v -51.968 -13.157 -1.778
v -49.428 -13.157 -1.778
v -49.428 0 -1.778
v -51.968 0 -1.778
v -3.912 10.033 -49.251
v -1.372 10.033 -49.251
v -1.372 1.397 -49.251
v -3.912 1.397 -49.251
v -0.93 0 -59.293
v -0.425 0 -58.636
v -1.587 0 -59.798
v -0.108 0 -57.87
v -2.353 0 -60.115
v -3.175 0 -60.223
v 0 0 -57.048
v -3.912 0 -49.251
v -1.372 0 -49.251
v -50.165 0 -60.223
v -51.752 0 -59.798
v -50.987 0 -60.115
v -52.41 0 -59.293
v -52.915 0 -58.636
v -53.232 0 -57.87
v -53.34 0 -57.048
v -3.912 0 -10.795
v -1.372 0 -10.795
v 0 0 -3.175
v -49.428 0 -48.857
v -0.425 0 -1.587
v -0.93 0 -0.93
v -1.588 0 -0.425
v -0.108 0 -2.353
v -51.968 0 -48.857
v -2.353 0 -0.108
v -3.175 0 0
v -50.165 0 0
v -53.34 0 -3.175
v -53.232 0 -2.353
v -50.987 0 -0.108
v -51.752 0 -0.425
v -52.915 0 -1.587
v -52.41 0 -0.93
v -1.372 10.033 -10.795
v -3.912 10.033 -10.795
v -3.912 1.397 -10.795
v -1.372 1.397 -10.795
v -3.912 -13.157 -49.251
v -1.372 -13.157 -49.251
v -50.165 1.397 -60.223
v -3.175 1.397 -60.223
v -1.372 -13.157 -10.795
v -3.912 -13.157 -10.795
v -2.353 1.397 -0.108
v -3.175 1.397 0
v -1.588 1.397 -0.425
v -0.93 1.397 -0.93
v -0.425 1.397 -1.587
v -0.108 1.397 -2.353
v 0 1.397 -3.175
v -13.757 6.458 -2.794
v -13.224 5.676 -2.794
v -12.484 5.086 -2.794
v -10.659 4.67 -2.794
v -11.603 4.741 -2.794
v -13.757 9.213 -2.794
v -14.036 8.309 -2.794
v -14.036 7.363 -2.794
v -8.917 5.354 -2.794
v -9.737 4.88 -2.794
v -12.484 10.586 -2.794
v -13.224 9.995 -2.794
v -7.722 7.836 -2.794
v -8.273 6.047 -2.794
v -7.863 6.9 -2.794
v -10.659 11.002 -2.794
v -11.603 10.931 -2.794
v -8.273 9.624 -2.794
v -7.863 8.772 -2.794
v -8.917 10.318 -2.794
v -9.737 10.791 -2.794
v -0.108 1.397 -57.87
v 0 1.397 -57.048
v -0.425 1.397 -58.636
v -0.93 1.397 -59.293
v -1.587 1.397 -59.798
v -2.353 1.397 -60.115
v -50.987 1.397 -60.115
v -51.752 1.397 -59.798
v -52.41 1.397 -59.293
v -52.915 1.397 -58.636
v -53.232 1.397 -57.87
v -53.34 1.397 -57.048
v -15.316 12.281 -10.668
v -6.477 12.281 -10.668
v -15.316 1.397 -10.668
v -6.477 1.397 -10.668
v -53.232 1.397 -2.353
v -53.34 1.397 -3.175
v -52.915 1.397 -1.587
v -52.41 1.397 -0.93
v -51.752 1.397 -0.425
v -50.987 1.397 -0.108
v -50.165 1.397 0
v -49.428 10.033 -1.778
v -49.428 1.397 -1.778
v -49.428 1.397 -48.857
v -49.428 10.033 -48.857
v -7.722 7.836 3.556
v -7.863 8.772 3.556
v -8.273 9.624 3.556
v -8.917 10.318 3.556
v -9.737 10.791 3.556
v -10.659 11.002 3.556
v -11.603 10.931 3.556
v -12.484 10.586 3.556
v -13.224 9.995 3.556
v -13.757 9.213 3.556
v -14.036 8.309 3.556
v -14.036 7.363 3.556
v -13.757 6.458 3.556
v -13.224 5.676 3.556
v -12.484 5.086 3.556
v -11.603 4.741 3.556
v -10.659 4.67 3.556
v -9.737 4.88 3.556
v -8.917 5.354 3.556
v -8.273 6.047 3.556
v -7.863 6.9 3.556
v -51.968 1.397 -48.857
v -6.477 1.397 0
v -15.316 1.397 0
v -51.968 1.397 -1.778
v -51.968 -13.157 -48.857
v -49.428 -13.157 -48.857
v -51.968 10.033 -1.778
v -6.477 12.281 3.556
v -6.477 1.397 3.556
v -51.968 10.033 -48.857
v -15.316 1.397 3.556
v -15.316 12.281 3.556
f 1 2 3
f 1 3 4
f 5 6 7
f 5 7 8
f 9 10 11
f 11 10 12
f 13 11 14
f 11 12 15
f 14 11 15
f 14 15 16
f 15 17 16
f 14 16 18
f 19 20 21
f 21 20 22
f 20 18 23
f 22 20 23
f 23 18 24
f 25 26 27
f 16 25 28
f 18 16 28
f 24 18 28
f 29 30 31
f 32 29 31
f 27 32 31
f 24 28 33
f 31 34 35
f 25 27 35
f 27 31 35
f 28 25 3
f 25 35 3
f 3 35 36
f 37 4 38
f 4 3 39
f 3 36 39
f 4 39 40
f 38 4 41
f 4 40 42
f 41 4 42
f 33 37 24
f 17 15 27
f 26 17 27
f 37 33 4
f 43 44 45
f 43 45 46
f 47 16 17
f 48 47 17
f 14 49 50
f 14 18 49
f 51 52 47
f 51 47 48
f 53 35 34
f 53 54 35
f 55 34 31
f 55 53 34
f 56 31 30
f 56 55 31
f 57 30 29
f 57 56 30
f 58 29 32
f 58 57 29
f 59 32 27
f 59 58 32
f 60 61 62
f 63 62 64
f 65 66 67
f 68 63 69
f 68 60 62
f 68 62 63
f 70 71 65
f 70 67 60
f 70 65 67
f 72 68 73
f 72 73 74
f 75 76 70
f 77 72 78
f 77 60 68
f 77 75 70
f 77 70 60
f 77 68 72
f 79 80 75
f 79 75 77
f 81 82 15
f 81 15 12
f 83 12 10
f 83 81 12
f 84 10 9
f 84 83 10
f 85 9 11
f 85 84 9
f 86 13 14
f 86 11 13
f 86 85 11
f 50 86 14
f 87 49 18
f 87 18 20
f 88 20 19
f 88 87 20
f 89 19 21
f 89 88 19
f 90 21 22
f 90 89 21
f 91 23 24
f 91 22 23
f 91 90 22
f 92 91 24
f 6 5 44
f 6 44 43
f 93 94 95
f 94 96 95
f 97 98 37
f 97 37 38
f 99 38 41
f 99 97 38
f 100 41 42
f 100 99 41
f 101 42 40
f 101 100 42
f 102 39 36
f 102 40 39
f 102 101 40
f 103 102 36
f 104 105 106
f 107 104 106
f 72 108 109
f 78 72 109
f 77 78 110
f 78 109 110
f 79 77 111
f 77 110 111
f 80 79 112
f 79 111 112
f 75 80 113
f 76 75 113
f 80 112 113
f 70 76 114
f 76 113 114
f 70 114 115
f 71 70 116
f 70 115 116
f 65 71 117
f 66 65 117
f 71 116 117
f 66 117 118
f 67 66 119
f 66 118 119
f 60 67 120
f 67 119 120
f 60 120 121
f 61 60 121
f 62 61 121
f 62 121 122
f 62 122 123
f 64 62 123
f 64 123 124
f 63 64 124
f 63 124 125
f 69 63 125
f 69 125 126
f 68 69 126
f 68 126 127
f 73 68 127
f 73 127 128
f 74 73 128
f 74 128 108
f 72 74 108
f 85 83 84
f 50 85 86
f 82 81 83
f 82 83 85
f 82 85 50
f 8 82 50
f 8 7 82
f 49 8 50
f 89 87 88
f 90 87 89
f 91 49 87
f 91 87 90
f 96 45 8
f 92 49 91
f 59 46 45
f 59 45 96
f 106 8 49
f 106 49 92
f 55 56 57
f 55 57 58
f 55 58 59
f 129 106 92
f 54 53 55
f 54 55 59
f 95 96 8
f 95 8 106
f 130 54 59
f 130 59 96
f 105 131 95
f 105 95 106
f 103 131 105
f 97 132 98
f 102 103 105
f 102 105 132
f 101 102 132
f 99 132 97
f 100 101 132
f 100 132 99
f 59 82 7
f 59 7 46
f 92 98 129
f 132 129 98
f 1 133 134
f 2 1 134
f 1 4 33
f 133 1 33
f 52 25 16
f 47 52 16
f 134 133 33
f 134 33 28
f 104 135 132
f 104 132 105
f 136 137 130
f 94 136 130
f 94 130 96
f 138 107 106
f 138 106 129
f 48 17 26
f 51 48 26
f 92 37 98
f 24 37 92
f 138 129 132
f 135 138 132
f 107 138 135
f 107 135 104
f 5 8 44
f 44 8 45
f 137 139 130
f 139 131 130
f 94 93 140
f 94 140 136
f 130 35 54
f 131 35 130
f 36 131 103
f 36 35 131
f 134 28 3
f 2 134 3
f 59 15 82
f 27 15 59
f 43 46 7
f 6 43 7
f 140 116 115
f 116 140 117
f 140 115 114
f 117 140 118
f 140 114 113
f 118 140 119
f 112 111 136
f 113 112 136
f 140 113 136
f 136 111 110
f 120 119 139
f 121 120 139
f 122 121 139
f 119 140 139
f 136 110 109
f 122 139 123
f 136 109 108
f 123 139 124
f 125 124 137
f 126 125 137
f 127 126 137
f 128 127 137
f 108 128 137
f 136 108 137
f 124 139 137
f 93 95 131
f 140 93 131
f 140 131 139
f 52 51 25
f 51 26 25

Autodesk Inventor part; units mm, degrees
ref_plane "YZ Plane" through (0, 0, 0) normal (1, 0, 0) x (0, 1, 0)
ref_plane "XZ Plane" through (0, 0, 0) normal (0, 1, 0) x (-1, 0, 0)
ref_plane "XY Plane" through (0, 0, 0) normal (0, 0, 1) x (1, 0, 0)
sketch "Sketch1" plane through (0, 0, 0) normal (0, 1, 0) x (-1, 0, 0)
  line L0 (0, 0) -> (53.34, 0)
  line L1 (53.34, 0) -> (53.34, -60.2234)
  line L2 (53.34, -60.2234) -> (0, -60.2234)
  line L3 (0, -60.2234) -> (0, 0)
  dimension "d0" = 53.34
  dimension "d1" = 60.2234
extrude "Extrusion1" add sketch "Sketch1" along normal blind 1.397
fillet "Fillet1" radius 3.175 4 edges at (0, 0.6985, -60.2234) (-53.34, 0.6985, -60.2234) (0, 0.6985, 0) (-53.34, 0.6985, 0)
sketch "Sketch2" plane through (0, 1.397, 0) normal (0, 1, 0) x (1, 0, 0)
  line L0 (0, 0) -> (-74.2846, 0) construction
  line L1 (0, 0) -> (0, 92.3898) construction
  line L2 (-3.9116, 10.795) -> (-1.3716, 10.795)
  line L3 (-1.3716, 10.795) -> (-1.3716, 49.2506)
  line L4 (-1.3716, 49.2506) -> (-3.9116, 49.2506)
  line L5 (-3.9116, 49.2506) -> (-3.9116, 10.795)
  line L6 (-51.9684, 1.778) -> (-49.4284, 1.778)
  line L7 (-49.4284, 1.778) -> (-49.4284, 48.8569)
  line L8 (-49.4284, 48.8569) -> (-51.9684, 48.8569)
  line L9 (-51.9684, 48.8569) -> (-51.9684, 1.778)
  line L10 (-53.34, 57.0484) -> (-53.34, 3.175) projected
  line L11 (-53.34, 50.5823) -> (-53.34, -10.1143) construction
  dimension "d5" = 2.54
  dimension "d6" = 2.54
  dimension "d7" = 38.4556
  dimension "d8" = 47.0789
  dimension "d9" = 1.778
  dimension "d10" = 3.9116
  dimension "d11" = 10.795
  dimension "d12" = 3.9116
extrude "Extrusion2" add sketch "Sketch2" along normal blind 8.636
sketch "Sketch3" plane through (0, 1.397, 0) normal (0, 1, 0) x (1, 0, 0)
  line L0 (0, 0) -> (-18.0314, 0) construction
  line L1 (-50.165, 0) -> (-3.175, 0) projected
  line L2 (0, 0) -> (0, 13.9144) construction
  line L3 (0, 3.175) -> (0, 57.0484) projected
  line L4 (-15.3162, -3.556) -> (-6.477, -3.556)
  line L5 (-6.477, -3.556) -> (-6.477, 10.668)
  line L6 (-6.477, 10.668) -> (-15.3162, 10.668)
  line L7 (-15.3162, 10.668) -> (-15.3162, -3.556)
  dimension "d19" = 8.8392
  dimension "d20" = 14.224
  dimension "d21" = 3.556
  dimension "d22" = 6.477
extrude "Extrusion3" add sketch "Sketch3" along normal blind 10.8839
sketch "Sketch4" plane through (0, 0, 0) normal (0, -1, 0) x (1, 0, 0)
  line L0 (0, 0) -> (0, -16.5285) construction
  line L1 (0, -3.175) -> (0, -57.0484) projected
  line L2 (0, 0) -> (-10.3791, 0) construction
  line L3 (-3.175, 0) -> (-50.165, 0) projected
  line L4 (-49.4284, -48.8569) -> (-49.4284, -1.778) projected
  line L5 (-51.9684, -1.778) -> (-51.9684, -48.8569) projected
  line L6 (-49.4284, -1.778) -> (-51.9684, -1.778)
  line L7 (-51.9684, -1.778) -> (-51.9684, -48.8569)
  line L8 (-51.9684, -48.8569) -> (-49.4284, -48.8569)
  line L9 (-49.4284, -48.8569) -> (-49.4284, -1.778)
  line L10 (-1.3716, -10.795) -> (-3.9116, -10.795)
  line L11 (-3.9116, -10.795) -> (-3.9116, -49.2506)
  line L12 (-3.9116, -49.2506) -> (-1.3716, -49.2506)
  line L13 (-1.3716, -49.2506) -> (-1.3716, -10.795)
  dimension "d25" = 47.0789
  dimension "d27" = 2.54
  dimension "d28" = 38.4556
  dimension "d29" = 10.795
  dimension "d30" = 3.9116
  dimension "d31" = 1.778
extrude "Extrusion4" add sketch "Sketch4" along normal blind 13.1572
sketch "Sketch5" plane through (-15.3162, 1.397, 3.556) normal (0, 0, 1) x (1, 0, 0)
  circle A0 centre (4.4196, 6.4389) radius 3.175
  line L0 (0, 10.8839) -> (8.8392, 10.8839) projected
  line L1 (4.4196, 10.8839) -> (4.4196, -0.1131) construction
  point P0 (15.3162, -1.397)
  dimension "d34" = 6.35
  dimension "d35" = 4.445
extrude "Extrusion5" cut sketch "Sketch5" against normal blind 6.35
properties part number "board_mockup"
